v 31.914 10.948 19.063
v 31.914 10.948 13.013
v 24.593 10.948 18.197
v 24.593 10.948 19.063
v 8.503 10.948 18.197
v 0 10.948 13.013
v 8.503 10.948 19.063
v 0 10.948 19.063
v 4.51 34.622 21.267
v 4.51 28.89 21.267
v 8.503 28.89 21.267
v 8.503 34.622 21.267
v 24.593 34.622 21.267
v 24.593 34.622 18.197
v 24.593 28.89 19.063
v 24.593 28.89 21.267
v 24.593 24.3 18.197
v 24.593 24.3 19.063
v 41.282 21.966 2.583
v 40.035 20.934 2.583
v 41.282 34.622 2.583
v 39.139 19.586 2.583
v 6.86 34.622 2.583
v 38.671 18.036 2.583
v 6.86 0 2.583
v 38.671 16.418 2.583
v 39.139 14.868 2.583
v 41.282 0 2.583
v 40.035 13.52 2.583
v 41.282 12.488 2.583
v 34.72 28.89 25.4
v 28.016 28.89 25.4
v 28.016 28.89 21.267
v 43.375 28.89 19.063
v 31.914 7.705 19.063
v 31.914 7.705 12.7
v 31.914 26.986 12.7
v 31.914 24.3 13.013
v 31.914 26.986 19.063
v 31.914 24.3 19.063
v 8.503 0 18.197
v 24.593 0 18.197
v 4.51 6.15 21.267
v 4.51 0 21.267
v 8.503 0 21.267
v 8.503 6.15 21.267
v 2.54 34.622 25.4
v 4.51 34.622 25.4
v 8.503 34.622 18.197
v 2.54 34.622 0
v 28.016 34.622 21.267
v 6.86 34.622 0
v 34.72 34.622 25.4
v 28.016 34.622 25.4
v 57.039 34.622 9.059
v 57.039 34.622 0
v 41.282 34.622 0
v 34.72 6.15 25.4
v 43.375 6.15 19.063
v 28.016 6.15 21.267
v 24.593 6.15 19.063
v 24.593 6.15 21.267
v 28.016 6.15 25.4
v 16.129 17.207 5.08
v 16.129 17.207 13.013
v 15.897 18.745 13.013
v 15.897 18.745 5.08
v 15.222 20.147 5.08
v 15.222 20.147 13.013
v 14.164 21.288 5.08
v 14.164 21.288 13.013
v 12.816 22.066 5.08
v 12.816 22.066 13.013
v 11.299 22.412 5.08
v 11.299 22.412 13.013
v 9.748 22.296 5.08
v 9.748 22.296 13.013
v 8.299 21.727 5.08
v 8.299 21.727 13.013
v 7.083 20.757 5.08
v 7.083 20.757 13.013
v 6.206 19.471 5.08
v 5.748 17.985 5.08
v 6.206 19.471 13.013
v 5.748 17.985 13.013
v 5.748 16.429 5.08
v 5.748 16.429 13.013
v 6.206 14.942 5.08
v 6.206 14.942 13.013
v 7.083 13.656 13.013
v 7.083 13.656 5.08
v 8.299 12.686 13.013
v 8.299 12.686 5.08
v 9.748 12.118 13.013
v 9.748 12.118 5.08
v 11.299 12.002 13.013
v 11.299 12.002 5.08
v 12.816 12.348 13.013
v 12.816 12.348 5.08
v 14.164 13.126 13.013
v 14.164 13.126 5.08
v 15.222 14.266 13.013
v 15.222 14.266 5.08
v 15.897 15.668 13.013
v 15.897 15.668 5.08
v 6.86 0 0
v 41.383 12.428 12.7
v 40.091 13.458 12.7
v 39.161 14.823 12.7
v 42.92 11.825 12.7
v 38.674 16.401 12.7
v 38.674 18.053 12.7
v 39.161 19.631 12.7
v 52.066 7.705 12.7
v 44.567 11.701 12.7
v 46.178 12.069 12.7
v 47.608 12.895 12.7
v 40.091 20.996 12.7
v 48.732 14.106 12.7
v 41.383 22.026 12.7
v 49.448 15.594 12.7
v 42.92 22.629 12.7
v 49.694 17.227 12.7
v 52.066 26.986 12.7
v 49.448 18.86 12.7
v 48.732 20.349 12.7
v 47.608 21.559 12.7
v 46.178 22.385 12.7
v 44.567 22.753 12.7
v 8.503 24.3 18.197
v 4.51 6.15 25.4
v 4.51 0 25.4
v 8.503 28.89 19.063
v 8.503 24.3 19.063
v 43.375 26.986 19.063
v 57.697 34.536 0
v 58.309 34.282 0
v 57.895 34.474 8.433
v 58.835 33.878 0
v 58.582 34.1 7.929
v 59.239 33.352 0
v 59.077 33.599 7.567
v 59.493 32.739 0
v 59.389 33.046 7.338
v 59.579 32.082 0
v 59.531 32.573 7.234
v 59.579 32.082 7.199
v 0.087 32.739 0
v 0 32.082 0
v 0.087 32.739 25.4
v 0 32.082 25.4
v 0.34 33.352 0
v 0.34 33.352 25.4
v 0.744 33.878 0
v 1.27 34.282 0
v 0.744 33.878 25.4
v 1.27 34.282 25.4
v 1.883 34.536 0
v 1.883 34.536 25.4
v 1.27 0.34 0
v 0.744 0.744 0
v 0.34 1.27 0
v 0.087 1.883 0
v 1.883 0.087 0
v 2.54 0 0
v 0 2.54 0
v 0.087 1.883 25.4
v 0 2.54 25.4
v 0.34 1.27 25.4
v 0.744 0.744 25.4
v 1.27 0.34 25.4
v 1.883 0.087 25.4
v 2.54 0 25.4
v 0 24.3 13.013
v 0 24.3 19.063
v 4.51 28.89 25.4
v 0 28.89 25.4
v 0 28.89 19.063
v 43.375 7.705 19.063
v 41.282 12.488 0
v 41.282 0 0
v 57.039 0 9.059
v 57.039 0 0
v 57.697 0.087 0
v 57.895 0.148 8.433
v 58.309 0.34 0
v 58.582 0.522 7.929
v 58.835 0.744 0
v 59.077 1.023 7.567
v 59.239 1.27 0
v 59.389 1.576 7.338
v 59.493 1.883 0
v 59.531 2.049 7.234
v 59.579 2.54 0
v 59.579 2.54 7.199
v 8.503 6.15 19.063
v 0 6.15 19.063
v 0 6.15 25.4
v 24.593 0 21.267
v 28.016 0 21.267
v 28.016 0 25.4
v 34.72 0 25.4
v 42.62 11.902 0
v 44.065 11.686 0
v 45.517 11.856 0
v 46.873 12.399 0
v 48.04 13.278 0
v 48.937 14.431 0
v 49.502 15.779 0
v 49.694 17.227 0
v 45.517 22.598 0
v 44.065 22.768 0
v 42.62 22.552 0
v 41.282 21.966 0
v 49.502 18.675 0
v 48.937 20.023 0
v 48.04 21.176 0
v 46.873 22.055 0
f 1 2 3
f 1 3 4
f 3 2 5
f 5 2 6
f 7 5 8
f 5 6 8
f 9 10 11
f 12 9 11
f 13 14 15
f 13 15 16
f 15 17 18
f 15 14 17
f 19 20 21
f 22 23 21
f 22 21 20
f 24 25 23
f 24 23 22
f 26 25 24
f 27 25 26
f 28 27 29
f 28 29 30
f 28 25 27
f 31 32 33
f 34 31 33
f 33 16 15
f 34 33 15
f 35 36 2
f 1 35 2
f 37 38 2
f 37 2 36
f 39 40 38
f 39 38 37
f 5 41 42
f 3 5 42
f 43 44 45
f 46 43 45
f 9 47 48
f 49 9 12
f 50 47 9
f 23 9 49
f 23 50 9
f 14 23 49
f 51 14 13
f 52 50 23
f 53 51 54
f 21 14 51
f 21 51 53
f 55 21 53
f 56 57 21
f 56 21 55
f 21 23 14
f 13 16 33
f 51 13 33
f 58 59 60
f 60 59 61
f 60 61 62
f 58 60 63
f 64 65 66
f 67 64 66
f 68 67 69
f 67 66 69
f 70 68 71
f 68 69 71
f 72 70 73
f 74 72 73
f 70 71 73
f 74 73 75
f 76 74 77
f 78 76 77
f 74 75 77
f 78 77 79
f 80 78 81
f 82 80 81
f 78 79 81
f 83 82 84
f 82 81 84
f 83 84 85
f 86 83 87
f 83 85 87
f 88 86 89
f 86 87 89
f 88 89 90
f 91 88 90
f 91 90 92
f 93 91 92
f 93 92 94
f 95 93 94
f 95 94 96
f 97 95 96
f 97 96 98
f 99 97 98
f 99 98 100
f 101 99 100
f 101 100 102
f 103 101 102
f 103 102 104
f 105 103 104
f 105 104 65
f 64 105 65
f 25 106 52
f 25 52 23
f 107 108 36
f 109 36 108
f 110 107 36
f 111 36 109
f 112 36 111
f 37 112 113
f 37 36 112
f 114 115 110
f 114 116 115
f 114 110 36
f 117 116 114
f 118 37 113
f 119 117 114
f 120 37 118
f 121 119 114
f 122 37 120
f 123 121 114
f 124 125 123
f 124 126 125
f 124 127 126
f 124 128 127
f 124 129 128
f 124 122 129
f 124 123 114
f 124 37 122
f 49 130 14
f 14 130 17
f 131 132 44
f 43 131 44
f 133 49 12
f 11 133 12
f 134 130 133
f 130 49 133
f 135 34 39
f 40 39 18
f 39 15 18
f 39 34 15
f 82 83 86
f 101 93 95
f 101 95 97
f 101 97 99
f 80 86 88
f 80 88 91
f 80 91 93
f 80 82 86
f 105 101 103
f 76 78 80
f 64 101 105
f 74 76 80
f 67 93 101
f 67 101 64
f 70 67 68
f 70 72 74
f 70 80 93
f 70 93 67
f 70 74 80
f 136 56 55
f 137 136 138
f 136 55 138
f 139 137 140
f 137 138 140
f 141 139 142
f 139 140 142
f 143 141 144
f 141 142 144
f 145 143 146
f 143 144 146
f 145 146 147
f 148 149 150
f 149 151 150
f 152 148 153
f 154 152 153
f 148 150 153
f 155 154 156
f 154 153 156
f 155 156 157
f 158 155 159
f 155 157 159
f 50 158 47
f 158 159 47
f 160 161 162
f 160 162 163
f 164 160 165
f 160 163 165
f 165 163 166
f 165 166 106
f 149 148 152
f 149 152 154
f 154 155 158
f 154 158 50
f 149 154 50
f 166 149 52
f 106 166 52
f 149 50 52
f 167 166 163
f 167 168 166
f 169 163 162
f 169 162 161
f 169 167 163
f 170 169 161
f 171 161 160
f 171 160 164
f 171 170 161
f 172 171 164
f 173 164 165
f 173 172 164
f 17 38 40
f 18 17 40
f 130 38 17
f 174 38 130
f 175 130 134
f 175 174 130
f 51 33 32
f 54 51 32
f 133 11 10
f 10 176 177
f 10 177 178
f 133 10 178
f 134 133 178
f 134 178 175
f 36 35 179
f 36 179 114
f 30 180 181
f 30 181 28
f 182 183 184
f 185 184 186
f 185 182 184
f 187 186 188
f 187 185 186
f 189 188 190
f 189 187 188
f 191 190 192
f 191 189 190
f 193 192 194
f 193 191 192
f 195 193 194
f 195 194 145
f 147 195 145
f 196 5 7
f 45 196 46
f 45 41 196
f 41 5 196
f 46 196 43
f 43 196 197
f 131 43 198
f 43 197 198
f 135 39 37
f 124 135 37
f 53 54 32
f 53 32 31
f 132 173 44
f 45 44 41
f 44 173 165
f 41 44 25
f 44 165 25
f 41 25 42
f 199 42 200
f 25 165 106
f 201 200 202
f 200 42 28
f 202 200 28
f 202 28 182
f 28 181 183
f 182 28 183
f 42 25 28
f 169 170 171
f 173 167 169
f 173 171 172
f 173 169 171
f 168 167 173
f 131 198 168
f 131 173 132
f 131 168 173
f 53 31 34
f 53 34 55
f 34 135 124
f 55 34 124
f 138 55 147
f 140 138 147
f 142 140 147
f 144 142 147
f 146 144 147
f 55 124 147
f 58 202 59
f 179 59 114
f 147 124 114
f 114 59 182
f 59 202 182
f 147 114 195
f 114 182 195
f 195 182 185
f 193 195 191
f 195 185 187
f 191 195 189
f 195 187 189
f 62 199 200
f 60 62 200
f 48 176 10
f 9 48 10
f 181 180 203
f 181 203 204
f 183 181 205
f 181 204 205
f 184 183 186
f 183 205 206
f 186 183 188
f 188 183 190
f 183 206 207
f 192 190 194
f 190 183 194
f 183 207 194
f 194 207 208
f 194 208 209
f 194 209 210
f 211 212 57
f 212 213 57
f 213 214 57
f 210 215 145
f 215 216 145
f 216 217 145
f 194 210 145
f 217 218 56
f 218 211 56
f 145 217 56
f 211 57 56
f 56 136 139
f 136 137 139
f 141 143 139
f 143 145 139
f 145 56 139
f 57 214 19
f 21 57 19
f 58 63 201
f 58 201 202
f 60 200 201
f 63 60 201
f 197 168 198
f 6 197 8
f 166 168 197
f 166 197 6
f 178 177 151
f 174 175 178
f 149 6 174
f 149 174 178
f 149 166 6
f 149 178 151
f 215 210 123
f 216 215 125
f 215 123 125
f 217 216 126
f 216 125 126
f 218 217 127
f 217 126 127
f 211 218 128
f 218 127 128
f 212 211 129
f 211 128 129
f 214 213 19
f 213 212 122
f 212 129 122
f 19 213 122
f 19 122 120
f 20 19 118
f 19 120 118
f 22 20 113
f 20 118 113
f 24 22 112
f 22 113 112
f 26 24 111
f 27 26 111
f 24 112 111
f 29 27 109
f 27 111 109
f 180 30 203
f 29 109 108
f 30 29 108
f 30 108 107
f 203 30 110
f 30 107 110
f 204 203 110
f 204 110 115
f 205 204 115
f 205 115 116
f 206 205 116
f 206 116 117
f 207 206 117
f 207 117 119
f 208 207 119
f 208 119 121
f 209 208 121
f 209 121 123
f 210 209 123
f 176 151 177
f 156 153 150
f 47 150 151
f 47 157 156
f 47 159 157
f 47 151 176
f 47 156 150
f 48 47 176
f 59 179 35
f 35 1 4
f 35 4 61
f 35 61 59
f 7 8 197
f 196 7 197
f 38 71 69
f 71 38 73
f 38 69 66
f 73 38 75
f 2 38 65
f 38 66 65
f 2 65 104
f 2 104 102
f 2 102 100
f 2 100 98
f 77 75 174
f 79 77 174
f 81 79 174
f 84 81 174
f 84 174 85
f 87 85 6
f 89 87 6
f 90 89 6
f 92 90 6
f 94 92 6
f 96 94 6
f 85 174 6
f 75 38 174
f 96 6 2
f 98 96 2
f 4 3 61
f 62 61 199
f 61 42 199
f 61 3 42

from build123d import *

# Parameters (mm, degrees)
F0_W      = 59.5793165267
F0_H      = 34.6220657229
F1_DEPTH  = 25.4
F3_R      = 5.5412544658
F4_DEPTH  = 25.401
F5_W      = 27.6657380164
F5_H      = 19.280704204
F5_R      = 5.5412544658
F6_DEPTH  = 12.7
F8_DEPTH  = 34.6230657229
F9_W      = 16.0899236798
F9_H      = 3.0700527132
F9_W_2    = 34.4220511615
F9_H_2    = 2.5833016261
F10_DEPTH = 34.6230657229
F11_W     = 13.3519666269
F11_H     = 6.0501107946
F12_DEPTH = 59.5803165267
F2_R      = 5.219783031
F14_DEPTH = 7.62
F13_R     = 5.219783031
F15_DEPTH = 20.32
F16_R     = 2.54


with BuildPart() as f1:
    # F0 (on Top) → F1 (new body)
    with BuildSketch(Plane.XY):
        with Locations((29.7896582633, 17.3110328615)):
            Rectangle(F0_W, F0_H)
    extrude(amount=F1_DEPTH)

    # F3 (on face) → F4 (cut, through all)
    with BuildSketch(Plane.XY.offset(25.4)):
        with Locations((44.1531315446, 17.2270387411)):
            Circle(F3_R)
    extrude(amount=-F4_DEPTH, mode=Mode.SUBTRACT)

    # F5 (on face) → F6 (cut)
    with BuildSketch(Plane.XY.offset(25.4)):
        with Locations((45.7464475185, 17.3452093732)):
            Rectangle(F5_W, F5_H)
        with Locations((44.1531315446, 17.2270387411)):
            Circle(F5_R, mode=Mode.SUBTRACT)
    extrude(amount=-F6_DEPTH, mode=Mode.SUBTRACT)

    # F7 (on face) → F8 (cut, through all)
    with BuildSketch(Plane.XZ):
        Polygon((59.5793165267, 25.4), (34.7196712036, 25.4), (59.5793165267, 7.1992731339), align=None)
    extrude(amount=-F8_DEPTH, mode=Mode.SUBTRACT)

    # F9 (on face) → F10 (cut, through all)
    with BuildSketch(Plane.XZ):
        Polygon((28.0164182186, 25.4), (4.5102257282, 25.4), (4.5102257282, 21.2667640299), (8.5027217865, 21.2667640299), (24.5926454663, 21.2667640299), (28.0164182186, 21.2667640299), align=None)
        with Locations((16.5476836264, 19.7317376733)):
            Rectangle(F9_W, F9_H)
        with Locations((24.0708049387, 1.2916508131)):
            Rectangle(F9_W_2, F9_H_2)
    extrude(amount=-F10_DEPTH, mode=Mode.SUBTRACT)

    # F11 (on face) → F12 (cut, through all)
    with BuildSketch(Plane(origin=(0, 0, 0), x_dir=(0, -1, 0), z_dir=(-1, 0, 0))):
        Polygon((-6.1496212147, 25.4), (-28.8896895945, 25.4), (-28.8896895945, 19.0630443394), (-24.2999512702, 19.0630443394), (-10.9479846433, 19.0630443394), (-6.1496212147, 19.0630443394), align=None)
        with Locations((-17.6239679568, 16.0379889421)):
            Rectangle(F11_W, F11_H)
    extrude(amount=-F12_DEPTH, mode=Mode.SUBTRACT)

    # F2 (on face) → F14 (cut)
    with BuildSketch(Plane.XY.offset(25.4)):
        with Locations((10.909142904, 17.2067172825)):
            Circle(F2_R)
    extrude(amount=-F14_DEPTH, mode=Mode.SUBTRACT)

    # F13 (on face) → F15 (cut)
    with BuildSketch(Plane.XY.offset(25.4)):
        with Locations((10.909142904, 17.2067172825)):
            Circle(F13_R)
    extrude(amount=-F15_DEPTH, mode=Mode.SUBTRACT)

    # F16
    f16_edges = [f1.edges().sort_by_distance(p)[0] for p in [
        (0, 0, 12.7),
        (59.579317, 0, 3.599637),
        (59.579317, 34.622066, 3.599637),
        (0, 34.622066, 12.7),
    ]]
    fillet(f16_edges, radius=F16_R)


solid = f1.part
